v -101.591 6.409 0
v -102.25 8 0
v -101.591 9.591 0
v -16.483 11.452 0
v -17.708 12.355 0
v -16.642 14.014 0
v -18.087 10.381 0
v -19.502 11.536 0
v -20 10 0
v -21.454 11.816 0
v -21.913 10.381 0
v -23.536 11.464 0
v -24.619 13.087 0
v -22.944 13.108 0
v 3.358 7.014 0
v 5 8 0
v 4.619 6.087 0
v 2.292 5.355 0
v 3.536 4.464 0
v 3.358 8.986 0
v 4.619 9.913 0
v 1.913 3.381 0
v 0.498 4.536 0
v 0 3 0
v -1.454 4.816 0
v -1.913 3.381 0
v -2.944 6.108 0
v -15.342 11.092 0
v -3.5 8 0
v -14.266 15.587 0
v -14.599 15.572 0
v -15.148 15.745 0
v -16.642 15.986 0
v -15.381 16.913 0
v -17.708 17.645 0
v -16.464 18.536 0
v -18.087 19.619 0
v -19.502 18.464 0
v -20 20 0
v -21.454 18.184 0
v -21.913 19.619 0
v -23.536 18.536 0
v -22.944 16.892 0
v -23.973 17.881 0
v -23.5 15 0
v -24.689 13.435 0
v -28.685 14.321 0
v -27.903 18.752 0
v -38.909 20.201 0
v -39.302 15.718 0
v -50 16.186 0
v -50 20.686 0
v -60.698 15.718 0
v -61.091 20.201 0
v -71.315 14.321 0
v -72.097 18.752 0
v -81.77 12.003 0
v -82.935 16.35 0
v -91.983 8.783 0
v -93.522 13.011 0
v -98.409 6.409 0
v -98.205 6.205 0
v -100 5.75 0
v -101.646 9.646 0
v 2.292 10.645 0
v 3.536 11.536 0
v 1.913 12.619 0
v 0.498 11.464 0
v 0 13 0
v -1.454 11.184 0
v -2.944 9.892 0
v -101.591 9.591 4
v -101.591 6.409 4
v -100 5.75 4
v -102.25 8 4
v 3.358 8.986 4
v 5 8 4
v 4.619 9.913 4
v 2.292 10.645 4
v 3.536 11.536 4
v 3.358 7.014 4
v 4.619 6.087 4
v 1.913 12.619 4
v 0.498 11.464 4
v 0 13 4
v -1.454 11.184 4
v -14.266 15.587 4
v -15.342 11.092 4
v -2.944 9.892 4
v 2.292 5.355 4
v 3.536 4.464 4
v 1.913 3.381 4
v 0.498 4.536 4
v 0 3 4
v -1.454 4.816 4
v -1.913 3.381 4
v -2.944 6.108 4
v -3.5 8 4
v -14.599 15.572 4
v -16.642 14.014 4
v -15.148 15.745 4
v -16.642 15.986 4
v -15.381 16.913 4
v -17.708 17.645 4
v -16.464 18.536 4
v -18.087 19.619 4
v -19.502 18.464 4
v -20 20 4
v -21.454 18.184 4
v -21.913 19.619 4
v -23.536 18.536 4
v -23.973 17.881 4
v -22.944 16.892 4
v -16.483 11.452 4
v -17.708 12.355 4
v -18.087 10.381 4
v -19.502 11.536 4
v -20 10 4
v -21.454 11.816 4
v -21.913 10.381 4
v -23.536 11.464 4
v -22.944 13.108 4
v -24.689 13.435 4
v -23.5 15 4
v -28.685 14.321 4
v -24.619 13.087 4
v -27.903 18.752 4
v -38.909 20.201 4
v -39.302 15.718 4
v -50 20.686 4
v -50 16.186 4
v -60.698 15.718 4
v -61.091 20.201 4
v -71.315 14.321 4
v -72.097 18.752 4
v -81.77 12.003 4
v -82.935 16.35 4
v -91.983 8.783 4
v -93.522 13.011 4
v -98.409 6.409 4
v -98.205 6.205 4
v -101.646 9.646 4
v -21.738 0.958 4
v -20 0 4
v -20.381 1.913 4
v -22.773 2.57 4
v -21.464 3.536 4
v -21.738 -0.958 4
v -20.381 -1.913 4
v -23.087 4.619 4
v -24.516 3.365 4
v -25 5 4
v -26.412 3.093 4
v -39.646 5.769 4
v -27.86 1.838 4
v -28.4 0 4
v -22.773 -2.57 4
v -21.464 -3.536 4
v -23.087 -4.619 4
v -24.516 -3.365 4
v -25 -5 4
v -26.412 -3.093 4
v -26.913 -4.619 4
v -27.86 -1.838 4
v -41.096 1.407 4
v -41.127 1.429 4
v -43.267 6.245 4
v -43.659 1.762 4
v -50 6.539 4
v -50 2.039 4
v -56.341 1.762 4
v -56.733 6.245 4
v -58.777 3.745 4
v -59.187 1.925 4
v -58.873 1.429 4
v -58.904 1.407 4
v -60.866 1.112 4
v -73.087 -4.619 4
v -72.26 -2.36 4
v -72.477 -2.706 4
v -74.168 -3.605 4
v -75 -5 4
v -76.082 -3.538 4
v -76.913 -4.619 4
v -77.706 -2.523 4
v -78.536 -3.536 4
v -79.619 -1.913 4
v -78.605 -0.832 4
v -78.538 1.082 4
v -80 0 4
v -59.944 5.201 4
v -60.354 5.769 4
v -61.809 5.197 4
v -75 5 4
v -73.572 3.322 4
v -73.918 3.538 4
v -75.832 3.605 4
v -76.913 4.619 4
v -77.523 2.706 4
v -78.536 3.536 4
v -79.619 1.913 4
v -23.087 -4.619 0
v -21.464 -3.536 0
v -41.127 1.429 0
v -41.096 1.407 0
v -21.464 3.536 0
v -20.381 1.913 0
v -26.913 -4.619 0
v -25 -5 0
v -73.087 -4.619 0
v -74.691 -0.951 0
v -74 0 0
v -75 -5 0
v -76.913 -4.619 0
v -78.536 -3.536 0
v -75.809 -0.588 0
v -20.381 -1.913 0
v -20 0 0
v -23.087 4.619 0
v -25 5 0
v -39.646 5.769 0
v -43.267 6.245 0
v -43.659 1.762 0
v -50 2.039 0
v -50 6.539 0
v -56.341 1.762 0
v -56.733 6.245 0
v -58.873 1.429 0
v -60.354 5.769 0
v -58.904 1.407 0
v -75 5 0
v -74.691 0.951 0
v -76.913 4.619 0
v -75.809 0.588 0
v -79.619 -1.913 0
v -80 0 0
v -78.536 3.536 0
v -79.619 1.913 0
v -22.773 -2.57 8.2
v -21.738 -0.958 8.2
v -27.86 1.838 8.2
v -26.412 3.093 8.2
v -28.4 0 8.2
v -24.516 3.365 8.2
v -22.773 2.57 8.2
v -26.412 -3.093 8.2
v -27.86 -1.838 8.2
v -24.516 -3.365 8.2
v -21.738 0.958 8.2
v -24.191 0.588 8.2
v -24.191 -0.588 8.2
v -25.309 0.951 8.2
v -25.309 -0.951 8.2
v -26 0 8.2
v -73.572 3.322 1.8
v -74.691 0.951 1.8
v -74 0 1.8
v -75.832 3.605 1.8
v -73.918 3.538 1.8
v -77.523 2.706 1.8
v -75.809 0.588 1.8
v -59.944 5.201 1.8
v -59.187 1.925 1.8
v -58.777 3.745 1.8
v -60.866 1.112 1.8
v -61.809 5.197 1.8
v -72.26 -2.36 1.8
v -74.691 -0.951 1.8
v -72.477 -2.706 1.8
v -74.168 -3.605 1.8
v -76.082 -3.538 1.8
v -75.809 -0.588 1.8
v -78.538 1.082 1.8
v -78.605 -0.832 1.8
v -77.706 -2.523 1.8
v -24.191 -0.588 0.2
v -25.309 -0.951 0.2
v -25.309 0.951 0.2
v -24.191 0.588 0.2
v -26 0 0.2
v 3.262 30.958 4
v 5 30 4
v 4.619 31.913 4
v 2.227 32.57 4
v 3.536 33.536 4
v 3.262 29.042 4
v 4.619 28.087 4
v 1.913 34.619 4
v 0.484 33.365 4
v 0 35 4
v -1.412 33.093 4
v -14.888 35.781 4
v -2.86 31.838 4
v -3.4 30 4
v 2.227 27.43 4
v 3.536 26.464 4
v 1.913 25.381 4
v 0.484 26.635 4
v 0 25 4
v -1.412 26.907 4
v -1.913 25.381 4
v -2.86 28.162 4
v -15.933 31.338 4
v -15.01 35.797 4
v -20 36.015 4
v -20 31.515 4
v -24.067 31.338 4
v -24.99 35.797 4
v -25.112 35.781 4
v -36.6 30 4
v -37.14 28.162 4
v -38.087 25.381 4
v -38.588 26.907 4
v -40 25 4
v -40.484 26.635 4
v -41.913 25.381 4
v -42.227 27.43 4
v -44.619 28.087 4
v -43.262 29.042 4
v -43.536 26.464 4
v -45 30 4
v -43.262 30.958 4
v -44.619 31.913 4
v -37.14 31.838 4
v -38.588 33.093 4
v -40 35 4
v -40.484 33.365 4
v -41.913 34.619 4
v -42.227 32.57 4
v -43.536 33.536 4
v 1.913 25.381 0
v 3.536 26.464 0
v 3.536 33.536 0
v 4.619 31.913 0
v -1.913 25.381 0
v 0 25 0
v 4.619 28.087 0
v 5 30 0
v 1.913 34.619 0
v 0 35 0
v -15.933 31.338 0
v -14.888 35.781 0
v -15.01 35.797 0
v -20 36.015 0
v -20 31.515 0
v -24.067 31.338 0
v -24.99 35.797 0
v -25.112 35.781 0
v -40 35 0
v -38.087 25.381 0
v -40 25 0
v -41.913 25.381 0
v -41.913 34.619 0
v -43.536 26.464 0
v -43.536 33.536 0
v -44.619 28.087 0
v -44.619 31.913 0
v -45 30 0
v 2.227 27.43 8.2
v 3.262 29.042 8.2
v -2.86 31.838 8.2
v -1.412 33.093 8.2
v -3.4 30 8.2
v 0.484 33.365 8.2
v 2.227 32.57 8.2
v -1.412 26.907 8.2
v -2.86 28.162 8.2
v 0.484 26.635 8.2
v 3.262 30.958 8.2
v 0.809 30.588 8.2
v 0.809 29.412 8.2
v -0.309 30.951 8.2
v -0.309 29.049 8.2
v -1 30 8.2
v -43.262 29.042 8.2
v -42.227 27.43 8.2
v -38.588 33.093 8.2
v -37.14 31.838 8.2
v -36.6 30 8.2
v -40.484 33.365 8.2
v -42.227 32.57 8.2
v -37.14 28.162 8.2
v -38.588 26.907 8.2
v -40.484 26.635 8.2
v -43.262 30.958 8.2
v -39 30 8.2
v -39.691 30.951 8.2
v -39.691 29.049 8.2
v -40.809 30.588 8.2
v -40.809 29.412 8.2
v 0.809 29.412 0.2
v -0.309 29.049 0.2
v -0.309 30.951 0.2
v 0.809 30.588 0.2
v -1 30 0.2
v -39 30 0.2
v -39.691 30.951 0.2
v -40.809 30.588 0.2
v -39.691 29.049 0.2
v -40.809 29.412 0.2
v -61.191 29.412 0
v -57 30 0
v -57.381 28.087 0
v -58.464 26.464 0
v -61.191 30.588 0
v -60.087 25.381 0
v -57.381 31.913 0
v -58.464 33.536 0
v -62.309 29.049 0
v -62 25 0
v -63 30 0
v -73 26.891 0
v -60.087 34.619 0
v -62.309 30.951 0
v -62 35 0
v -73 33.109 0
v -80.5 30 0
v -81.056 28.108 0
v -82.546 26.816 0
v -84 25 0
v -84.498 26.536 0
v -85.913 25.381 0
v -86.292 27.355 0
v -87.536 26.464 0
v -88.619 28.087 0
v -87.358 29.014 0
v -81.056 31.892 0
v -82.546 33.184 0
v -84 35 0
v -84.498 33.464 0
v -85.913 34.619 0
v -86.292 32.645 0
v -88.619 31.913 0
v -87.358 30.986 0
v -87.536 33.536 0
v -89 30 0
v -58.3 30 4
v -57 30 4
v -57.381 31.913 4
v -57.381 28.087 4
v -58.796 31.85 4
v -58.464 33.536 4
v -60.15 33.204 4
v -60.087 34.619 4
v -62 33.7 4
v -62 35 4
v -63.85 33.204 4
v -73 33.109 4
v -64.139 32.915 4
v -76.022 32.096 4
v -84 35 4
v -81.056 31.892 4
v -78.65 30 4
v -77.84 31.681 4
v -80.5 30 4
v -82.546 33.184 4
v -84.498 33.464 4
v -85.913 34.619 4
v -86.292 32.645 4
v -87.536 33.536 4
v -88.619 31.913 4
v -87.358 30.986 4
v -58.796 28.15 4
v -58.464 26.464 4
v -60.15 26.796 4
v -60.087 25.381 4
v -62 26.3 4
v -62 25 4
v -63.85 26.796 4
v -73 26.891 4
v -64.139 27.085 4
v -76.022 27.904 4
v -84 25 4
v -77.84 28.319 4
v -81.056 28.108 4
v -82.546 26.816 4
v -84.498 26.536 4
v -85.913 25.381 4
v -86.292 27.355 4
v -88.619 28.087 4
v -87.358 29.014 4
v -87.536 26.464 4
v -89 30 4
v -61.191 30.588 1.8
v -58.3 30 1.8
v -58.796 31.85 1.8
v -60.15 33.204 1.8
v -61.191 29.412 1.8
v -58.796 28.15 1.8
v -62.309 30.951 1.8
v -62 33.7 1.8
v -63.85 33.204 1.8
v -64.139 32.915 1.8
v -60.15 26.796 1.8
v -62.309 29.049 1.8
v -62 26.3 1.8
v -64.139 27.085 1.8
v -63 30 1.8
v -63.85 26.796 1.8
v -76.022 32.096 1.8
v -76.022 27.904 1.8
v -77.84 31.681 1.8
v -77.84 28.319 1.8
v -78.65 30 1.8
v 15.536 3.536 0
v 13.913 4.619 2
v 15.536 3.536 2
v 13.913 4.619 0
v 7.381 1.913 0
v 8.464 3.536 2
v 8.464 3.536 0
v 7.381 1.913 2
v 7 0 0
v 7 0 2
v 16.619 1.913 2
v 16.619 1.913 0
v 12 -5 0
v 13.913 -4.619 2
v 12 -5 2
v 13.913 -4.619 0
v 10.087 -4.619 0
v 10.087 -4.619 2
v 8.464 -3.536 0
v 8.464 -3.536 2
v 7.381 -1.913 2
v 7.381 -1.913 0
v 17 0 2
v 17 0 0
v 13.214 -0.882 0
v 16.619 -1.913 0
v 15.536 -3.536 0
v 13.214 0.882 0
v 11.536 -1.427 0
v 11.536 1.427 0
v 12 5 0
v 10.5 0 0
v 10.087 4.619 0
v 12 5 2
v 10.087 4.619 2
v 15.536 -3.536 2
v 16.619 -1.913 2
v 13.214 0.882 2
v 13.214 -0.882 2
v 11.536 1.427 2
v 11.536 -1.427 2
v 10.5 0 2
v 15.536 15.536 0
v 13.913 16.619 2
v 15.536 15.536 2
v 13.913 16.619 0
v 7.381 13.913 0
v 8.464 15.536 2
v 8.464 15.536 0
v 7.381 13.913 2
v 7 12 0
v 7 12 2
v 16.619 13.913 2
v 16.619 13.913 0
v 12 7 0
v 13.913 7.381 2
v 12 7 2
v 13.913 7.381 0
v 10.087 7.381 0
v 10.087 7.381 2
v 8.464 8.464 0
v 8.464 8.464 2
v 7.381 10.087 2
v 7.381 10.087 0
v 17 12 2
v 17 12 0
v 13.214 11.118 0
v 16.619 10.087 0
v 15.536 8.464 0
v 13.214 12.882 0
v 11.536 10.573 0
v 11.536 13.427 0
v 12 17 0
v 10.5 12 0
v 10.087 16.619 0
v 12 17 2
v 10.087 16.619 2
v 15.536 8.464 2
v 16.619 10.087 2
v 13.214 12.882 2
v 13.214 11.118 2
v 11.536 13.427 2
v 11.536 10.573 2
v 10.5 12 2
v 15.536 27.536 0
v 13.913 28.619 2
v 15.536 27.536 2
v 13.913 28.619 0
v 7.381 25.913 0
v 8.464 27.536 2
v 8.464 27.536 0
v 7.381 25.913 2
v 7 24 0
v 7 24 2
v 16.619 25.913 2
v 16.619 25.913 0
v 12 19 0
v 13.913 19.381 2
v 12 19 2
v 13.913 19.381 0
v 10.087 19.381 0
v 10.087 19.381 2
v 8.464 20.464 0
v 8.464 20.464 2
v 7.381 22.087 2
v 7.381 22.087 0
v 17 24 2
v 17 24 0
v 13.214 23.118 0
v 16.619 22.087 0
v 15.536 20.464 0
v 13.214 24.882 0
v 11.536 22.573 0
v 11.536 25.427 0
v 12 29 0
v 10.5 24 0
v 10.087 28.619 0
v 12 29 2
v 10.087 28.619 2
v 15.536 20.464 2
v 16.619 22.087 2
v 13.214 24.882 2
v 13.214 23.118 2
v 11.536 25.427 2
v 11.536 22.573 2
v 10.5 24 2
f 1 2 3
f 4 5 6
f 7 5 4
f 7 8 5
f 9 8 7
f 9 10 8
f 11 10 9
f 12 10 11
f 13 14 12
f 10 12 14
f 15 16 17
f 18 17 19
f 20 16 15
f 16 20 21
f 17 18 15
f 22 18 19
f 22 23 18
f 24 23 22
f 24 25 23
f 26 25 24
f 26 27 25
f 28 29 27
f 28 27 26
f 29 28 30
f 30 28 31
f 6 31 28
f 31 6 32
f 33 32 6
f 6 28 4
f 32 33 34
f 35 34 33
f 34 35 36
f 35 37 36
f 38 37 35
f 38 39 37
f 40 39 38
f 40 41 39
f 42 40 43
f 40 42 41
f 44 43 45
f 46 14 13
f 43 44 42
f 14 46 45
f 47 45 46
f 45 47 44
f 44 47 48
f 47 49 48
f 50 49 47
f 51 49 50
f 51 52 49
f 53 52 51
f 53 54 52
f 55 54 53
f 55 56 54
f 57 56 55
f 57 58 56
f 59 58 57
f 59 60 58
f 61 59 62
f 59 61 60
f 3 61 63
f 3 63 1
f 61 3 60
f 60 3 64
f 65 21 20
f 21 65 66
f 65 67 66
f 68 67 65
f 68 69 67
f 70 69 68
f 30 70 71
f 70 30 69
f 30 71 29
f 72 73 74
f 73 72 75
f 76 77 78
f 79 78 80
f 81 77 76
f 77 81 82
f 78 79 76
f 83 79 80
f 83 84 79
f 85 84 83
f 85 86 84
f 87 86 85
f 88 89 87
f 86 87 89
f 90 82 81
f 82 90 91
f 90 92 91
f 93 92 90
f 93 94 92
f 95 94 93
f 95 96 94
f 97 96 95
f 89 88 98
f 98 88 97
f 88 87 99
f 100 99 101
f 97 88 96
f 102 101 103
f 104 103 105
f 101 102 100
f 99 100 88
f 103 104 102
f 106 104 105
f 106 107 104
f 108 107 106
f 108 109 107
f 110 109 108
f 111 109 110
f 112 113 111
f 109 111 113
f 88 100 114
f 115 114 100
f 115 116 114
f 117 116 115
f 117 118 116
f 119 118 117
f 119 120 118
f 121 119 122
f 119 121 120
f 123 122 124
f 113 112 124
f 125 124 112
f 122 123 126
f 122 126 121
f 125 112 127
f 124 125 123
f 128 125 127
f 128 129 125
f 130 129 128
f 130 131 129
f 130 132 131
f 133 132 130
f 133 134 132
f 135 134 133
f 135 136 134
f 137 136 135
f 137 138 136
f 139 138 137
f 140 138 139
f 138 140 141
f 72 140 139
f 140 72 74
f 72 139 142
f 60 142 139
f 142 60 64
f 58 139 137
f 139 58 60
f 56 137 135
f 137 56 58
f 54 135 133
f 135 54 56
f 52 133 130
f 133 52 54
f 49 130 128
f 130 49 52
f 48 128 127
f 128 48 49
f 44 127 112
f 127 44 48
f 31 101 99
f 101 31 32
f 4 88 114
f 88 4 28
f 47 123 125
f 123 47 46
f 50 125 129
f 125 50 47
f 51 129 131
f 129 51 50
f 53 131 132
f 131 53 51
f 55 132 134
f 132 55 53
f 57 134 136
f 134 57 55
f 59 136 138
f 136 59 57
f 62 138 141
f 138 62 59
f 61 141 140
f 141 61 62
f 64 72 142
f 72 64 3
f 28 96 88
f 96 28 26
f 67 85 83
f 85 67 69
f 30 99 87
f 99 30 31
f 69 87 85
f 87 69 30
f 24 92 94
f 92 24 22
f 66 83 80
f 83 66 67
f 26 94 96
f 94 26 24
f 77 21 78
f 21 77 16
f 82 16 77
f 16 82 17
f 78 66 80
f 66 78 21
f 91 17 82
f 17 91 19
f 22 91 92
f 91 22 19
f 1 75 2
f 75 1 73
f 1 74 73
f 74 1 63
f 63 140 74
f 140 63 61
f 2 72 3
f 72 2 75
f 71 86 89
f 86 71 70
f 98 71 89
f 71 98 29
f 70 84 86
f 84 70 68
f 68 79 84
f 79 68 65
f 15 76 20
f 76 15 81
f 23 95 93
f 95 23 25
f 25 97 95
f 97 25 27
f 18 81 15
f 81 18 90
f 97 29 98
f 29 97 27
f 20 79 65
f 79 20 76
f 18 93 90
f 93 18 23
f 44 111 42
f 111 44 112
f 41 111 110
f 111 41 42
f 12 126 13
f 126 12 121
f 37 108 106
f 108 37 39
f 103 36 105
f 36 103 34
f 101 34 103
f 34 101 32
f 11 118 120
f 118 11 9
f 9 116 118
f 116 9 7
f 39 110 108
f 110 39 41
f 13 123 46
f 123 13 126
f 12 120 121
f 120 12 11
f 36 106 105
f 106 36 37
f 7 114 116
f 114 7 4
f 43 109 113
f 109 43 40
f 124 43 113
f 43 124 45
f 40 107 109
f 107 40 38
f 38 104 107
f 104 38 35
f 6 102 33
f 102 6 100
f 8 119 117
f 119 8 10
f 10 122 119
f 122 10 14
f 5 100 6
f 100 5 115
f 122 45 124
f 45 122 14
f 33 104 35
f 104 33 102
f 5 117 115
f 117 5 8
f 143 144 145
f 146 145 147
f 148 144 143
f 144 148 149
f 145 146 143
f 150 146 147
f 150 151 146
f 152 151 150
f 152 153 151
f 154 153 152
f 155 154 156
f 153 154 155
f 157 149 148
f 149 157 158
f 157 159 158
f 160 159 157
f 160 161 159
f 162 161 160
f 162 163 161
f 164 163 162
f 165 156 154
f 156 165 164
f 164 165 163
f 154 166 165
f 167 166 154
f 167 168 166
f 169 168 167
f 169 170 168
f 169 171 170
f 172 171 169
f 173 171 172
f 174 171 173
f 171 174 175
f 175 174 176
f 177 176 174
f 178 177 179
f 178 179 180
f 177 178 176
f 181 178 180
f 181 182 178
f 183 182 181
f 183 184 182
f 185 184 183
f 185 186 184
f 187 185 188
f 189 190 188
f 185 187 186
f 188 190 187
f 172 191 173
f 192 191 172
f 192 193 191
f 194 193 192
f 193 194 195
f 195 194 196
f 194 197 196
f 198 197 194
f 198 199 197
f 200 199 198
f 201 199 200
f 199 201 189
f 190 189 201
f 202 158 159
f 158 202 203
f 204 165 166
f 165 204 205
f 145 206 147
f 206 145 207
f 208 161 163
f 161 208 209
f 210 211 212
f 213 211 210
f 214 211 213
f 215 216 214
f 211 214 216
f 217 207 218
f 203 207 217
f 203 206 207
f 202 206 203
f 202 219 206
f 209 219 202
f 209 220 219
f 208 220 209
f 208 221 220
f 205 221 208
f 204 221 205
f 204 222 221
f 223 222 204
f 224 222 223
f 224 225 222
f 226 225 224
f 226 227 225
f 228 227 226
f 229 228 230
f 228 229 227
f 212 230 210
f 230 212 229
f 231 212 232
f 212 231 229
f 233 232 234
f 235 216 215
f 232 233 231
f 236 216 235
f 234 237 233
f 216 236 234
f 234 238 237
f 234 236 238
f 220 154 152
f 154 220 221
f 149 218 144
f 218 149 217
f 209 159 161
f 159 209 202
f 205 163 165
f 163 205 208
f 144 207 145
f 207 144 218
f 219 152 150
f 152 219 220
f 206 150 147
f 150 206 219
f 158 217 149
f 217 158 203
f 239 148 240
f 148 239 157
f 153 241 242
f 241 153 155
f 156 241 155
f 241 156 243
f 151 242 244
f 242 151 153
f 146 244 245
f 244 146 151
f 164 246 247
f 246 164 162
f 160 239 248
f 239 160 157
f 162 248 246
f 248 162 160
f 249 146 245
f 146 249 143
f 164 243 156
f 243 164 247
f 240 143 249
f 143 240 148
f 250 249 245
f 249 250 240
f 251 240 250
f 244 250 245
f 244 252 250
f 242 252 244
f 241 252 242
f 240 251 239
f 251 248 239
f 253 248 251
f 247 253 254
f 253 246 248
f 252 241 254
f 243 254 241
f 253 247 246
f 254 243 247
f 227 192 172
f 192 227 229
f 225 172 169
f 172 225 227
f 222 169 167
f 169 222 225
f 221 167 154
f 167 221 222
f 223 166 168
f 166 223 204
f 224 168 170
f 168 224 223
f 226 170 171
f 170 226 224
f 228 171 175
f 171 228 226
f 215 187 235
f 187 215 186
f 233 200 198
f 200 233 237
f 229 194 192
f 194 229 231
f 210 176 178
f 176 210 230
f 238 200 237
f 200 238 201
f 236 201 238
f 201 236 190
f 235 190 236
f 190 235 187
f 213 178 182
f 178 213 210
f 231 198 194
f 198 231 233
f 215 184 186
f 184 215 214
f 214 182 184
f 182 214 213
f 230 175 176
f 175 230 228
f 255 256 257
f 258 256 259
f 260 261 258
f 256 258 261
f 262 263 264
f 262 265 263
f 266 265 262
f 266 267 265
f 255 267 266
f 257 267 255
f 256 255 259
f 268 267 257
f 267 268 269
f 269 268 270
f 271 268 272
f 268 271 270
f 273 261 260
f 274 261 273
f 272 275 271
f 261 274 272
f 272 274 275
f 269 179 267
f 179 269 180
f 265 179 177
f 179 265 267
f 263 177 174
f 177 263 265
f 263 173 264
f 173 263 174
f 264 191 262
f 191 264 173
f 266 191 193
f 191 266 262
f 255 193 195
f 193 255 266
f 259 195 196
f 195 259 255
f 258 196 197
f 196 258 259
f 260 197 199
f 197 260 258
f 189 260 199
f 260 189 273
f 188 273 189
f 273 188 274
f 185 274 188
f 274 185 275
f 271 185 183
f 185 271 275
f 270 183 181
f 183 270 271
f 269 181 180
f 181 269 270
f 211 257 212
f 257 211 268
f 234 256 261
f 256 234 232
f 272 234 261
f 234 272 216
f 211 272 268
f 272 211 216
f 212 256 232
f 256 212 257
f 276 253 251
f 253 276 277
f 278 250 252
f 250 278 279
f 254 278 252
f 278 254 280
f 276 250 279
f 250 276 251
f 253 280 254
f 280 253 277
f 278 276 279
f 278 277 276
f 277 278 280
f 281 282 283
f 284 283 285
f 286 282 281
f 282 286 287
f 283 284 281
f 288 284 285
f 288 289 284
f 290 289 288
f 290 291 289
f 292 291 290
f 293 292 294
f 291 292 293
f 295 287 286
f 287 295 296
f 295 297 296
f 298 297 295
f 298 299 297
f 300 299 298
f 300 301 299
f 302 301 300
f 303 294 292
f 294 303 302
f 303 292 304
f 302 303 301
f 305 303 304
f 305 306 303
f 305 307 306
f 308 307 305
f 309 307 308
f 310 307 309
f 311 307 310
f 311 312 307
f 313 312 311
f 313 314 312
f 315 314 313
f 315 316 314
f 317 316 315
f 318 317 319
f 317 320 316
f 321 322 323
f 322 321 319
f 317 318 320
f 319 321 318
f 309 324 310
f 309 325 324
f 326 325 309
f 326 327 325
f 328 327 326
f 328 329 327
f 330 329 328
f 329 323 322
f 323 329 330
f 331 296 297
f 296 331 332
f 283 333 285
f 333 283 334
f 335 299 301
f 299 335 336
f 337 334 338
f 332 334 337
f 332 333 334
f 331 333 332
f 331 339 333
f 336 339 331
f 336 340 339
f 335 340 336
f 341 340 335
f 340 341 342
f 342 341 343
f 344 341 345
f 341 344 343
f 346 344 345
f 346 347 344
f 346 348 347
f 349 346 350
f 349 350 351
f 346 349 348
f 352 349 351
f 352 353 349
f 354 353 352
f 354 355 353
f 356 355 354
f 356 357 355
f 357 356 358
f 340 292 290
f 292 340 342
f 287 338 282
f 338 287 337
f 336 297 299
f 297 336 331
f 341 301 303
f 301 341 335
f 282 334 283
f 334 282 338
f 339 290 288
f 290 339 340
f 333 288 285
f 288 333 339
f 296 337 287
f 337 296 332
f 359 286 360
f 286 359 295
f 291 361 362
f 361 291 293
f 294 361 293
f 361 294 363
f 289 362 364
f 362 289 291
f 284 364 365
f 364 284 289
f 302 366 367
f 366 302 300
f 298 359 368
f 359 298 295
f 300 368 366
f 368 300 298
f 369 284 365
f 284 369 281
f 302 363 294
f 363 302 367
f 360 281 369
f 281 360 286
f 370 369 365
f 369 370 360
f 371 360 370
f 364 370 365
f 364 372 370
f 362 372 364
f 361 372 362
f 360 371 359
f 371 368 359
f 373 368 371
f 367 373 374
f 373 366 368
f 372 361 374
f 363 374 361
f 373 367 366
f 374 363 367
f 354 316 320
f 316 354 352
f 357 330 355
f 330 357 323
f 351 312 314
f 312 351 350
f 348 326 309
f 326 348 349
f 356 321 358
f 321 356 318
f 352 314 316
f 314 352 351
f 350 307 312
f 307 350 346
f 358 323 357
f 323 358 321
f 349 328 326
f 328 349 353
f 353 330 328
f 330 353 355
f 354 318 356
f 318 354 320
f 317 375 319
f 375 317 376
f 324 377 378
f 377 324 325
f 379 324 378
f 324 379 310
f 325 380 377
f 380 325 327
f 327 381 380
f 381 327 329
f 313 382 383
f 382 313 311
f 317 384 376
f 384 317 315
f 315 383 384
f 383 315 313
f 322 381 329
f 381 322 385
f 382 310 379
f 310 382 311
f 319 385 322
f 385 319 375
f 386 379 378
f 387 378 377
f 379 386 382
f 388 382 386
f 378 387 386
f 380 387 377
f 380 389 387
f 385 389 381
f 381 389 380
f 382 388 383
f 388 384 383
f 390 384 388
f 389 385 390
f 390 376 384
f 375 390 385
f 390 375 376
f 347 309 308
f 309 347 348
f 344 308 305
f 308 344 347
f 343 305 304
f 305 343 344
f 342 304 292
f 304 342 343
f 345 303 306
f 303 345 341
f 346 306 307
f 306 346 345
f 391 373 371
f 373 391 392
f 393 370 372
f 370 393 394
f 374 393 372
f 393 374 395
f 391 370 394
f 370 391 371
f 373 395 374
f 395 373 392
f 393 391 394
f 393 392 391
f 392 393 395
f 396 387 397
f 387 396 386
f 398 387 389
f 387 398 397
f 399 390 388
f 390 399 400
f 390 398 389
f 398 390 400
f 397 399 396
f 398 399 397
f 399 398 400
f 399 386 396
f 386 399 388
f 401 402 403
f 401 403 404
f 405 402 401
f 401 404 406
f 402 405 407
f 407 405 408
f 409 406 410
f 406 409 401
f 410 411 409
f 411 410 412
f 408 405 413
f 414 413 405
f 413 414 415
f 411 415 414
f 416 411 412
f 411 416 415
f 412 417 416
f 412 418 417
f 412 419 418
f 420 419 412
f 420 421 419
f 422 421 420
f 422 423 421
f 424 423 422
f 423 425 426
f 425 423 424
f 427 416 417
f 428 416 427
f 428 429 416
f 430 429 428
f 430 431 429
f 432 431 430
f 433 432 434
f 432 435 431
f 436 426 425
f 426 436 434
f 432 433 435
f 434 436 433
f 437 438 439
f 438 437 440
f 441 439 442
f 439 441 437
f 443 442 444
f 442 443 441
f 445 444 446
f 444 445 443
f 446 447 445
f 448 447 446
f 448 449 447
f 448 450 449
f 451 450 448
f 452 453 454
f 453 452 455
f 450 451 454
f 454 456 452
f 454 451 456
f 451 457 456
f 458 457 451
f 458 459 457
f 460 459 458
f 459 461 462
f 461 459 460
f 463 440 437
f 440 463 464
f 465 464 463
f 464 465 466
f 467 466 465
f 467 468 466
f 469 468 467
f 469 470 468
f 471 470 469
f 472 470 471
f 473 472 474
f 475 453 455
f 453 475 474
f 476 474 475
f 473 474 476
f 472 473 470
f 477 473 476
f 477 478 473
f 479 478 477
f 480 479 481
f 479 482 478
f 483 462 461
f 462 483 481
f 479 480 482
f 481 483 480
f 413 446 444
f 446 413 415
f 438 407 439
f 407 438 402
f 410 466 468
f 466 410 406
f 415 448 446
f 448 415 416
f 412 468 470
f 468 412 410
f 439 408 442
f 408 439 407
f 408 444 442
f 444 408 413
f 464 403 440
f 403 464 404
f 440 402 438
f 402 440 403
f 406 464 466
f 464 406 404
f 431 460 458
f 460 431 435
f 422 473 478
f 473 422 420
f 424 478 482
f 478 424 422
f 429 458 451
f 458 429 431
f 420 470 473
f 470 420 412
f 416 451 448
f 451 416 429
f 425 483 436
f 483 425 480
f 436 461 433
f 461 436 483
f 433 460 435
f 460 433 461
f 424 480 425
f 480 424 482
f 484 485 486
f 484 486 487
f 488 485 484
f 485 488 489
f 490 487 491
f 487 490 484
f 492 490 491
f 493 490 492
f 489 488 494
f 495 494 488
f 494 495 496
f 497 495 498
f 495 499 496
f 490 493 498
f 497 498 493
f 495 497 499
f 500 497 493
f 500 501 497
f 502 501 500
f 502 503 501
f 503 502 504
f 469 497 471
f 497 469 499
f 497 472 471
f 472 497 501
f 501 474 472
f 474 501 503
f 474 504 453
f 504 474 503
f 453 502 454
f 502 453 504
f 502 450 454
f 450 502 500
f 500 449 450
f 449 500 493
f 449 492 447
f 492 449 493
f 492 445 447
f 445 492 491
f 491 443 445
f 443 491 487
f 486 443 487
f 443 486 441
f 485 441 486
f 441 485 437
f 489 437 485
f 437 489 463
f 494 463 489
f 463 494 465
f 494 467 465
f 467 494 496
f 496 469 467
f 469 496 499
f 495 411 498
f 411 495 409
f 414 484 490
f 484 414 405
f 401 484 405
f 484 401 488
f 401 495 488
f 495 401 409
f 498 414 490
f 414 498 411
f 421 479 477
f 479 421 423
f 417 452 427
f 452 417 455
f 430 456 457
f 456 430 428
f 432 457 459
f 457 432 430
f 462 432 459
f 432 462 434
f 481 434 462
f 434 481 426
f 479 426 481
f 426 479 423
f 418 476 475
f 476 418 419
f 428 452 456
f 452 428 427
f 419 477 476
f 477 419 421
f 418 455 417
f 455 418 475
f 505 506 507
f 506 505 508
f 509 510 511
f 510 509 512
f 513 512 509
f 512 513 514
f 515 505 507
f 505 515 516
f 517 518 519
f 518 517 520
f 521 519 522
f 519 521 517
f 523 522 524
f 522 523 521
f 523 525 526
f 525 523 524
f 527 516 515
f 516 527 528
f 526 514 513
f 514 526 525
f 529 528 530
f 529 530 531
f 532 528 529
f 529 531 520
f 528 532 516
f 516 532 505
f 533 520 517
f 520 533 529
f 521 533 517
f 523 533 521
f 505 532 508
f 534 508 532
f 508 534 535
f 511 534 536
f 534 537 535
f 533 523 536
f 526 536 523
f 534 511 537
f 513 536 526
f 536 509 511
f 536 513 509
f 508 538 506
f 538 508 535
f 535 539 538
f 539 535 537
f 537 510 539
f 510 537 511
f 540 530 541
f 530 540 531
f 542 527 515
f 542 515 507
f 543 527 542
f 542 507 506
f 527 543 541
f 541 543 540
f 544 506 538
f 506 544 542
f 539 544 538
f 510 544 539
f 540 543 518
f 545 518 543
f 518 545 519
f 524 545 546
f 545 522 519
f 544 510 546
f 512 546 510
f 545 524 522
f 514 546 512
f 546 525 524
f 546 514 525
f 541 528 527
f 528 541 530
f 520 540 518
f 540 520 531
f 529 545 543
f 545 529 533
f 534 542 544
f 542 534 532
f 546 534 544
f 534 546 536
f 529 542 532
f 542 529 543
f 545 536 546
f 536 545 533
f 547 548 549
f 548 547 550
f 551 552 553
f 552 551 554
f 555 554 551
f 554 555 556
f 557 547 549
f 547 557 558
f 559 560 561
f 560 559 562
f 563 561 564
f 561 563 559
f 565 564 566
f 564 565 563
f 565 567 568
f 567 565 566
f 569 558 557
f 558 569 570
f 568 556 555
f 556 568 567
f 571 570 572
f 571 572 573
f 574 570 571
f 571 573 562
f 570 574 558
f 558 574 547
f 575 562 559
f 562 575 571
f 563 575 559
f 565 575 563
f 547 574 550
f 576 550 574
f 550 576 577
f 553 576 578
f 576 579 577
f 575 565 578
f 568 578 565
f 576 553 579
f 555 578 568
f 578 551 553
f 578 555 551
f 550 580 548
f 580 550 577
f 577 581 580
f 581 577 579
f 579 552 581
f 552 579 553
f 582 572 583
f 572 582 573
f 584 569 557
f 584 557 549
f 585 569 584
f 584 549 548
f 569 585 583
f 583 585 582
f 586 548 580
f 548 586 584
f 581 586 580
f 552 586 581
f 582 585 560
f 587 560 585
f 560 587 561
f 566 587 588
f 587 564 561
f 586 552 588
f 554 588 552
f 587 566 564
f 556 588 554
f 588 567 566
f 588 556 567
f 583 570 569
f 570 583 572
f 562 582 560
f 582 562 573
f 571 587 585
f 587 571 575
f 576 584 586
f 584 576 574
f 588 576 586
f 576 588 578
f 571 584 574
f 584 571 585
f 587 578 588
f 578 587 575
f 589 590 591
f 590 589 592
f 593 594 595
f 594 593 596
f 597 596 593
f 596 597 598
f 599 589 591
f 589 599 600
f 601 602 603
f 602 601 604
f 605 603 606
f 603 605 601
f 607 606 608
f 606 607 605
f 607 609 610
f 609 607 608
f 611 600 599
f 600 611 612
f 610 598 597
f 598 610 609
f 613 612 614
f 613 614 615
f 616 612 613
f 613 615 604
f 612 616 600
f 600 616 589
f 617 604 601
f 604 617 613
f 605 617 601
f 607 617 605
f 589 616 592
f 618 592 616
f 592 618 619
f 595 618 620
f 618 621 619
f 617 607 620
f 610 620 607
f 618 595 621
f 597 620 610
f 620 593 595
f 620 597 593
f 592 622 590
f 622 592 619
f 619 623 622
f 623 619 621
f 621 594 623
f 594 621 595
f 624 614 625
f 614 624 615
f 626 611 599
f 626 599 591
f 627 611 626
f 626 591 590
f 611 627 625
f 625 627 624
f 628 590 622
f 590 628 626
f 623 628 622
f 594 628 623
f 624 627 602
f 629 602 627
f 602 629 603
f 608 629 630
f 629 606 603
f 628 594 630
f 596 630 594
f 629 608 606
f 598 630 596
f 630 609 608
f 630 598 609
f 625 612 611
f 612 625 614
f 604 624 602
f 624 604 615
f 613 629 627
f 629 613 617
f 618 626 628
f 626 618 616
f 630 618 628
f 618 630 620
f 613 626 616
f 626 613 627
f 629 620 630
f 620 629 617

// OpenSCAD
// file: spider.scad
screwD = 2; // Diameter of screw holes.
washerD=3; // Diameter of washer holes.
slackD=0.4; // Difference in diameter of pegs and holes
slack=0.2; // Extra height of pegs compared to holes.
horn=2.2; // Depth of the horn attachment.

edge = 5; // Thickness of the edges
bar = 2; // Thickness of the bar


hinge = 0.5; // Thickness of the flexible hinge (must be very thin!)
gap = 1; // The gap between the two hinged parts.
back = 2; // Thickness of the backing for the switch holder
wing = 5; // Size of the wing attachments for the servo motors

// Size of the void to hold the
switchX = 13.5;
switchY = 9.5;
switchZ = 6;

// Length of the overhang, where the switch holder attaches to the main body.
overhang = 20;

// Size of the hole for a servo motor.
w = 23;
l = 16.5;
h = 12.5;


// "end" Constants passes to strut module
FOOT=0;
PEG=1;
HOLE=2;
ATTACHMENT=3;

capThickness=2;
surround=3; // Thickness of plastic around the pegs.

module spokeProfile(slack=0.3)
{
    hull() {
        circle( d=6 +slack );
        translate([14.5,0]) circle( d=4+slack );
    }
    circle( d=7 + slackD );
}


module attachment( thickness, depth=horn )
{
    translate([0,0,thickness-depth]) linear_extrude( thickness ) spokeProfile();
}

module doubleAttachment( depth=horn )
{   
    linear_extrude( depth ) {
        spokeProfile();
        mirror( [1,0] ) spokeProfile();
    }
}

module hole(d)
{
    cylinder( d=d, h=20, center=true );
}


module length( l, w=4.5, curve=0 )
{
    if (curve == 0) {
        hull() {
            circle( d=w );
            translate( [l, 0] ) circle( d=w );
        }
    } else {
        intersection() {
            translate([l/2,-sqrt( curve*curve/4 - l*l/4 ) ])
            difference() {
                circle( d=curve+w, $fa=5 );
                circle( d=curve-w, $fa=5 );
            }
            // Cut out just the segment of the circle we need.
            translate( [l/2, -l/2] ) rotate( 45 ) square( [curve,curve] );
        }
    }
}
// main file
include <spider.scad>;

module washer( peg=7 )
{
    difference() {
        cylinder( d=peg+surround, h=capThickness );
        translate([0,0,-1]) cylinder( d=washerD, h=capThickness + 2 );
    }
}

module strut( l, endA, endB, w=4.5, thickness=4, peg=7, curve=0, angle=0)
{
    bulge = peg+surround;

    module endPositive( type )
    {
        if ( type == FOOT ) {
            cylinder( d=w, h=thickness );
        } else {
            hull() {
                cylinder( d=bulge, h=thickness );
                rotate([0,0,angle]) translate( [16,0,0] ) cylinder( d=w, h=thickness );
            }
        }
        if (type == PEG) {
            translate( [0,0,1] ) cylinder( d=peg-slack, h=thickness*2 -1+slack );
        }

    }

    module endNegative( type )
    {
        if (type == PEG) {
            translate( [0,0,0.2] ) cylinder( d=screwD, h=thickness*2+2 );
        }
        if (type == HOLE) {
            hole(peg);
        }

        if (type == ATTACHMENT) {
            rotate([0,0,angle]) attachment(thickness);
            translate([0,0,-1]) linear_extrude(10) screwHole();
        }
    }

    difference() {

        union() {
            linear_extrude( thickness ) {
                length( l=l, w=w, curve=curve );
            }
            endPositive( endA );
            translate( [l,0,0] ) mirror( [1,0,0] ) endPositive( endB );
        }

        endNegative( endA );
        translate( [l,0,0] ) mirror( [1,0,0] ) endNegative( endB );

    }
}

module extraHole( x, y=0, peg=7, thickness=4 )
{
    difference() {
        union() {
            translate([x,y,0]) cylinder(d=peg+surround, h=thickness);
            children();
        }
        translate([x,y,0]) hole(d=peg);
    }
}

module screwHole()
{
    circle( d=screwD );
}


module washers(n=3)
{
    for ( i = [0:n-1]) {
        translate( [-12,i * 12,0] ) washer();
    }
}

module pieces()
{
    // Longest (shin)
    translate([0,8,0]) extraHole( 20, 7 ) strut( 100, HOLE, FOOT, curve=250, angle=20 );
    
    // Thigh
    translate([25,0,0]) strut( 50, PEG, ATTACHMENT , curve=150, angle=13 );

    // Inner thigh
    translate([0,30,0]) strut( 40, PEG, PEG, curve=110, angle=13 );
    
    // Arm pit
    translate([62,30,0]) strut( 22, ATTACHMENT, HOLE );

    washers(3);
}


mirror([1,0,0]) pieces();
//pieces();

//washers( 3 );
